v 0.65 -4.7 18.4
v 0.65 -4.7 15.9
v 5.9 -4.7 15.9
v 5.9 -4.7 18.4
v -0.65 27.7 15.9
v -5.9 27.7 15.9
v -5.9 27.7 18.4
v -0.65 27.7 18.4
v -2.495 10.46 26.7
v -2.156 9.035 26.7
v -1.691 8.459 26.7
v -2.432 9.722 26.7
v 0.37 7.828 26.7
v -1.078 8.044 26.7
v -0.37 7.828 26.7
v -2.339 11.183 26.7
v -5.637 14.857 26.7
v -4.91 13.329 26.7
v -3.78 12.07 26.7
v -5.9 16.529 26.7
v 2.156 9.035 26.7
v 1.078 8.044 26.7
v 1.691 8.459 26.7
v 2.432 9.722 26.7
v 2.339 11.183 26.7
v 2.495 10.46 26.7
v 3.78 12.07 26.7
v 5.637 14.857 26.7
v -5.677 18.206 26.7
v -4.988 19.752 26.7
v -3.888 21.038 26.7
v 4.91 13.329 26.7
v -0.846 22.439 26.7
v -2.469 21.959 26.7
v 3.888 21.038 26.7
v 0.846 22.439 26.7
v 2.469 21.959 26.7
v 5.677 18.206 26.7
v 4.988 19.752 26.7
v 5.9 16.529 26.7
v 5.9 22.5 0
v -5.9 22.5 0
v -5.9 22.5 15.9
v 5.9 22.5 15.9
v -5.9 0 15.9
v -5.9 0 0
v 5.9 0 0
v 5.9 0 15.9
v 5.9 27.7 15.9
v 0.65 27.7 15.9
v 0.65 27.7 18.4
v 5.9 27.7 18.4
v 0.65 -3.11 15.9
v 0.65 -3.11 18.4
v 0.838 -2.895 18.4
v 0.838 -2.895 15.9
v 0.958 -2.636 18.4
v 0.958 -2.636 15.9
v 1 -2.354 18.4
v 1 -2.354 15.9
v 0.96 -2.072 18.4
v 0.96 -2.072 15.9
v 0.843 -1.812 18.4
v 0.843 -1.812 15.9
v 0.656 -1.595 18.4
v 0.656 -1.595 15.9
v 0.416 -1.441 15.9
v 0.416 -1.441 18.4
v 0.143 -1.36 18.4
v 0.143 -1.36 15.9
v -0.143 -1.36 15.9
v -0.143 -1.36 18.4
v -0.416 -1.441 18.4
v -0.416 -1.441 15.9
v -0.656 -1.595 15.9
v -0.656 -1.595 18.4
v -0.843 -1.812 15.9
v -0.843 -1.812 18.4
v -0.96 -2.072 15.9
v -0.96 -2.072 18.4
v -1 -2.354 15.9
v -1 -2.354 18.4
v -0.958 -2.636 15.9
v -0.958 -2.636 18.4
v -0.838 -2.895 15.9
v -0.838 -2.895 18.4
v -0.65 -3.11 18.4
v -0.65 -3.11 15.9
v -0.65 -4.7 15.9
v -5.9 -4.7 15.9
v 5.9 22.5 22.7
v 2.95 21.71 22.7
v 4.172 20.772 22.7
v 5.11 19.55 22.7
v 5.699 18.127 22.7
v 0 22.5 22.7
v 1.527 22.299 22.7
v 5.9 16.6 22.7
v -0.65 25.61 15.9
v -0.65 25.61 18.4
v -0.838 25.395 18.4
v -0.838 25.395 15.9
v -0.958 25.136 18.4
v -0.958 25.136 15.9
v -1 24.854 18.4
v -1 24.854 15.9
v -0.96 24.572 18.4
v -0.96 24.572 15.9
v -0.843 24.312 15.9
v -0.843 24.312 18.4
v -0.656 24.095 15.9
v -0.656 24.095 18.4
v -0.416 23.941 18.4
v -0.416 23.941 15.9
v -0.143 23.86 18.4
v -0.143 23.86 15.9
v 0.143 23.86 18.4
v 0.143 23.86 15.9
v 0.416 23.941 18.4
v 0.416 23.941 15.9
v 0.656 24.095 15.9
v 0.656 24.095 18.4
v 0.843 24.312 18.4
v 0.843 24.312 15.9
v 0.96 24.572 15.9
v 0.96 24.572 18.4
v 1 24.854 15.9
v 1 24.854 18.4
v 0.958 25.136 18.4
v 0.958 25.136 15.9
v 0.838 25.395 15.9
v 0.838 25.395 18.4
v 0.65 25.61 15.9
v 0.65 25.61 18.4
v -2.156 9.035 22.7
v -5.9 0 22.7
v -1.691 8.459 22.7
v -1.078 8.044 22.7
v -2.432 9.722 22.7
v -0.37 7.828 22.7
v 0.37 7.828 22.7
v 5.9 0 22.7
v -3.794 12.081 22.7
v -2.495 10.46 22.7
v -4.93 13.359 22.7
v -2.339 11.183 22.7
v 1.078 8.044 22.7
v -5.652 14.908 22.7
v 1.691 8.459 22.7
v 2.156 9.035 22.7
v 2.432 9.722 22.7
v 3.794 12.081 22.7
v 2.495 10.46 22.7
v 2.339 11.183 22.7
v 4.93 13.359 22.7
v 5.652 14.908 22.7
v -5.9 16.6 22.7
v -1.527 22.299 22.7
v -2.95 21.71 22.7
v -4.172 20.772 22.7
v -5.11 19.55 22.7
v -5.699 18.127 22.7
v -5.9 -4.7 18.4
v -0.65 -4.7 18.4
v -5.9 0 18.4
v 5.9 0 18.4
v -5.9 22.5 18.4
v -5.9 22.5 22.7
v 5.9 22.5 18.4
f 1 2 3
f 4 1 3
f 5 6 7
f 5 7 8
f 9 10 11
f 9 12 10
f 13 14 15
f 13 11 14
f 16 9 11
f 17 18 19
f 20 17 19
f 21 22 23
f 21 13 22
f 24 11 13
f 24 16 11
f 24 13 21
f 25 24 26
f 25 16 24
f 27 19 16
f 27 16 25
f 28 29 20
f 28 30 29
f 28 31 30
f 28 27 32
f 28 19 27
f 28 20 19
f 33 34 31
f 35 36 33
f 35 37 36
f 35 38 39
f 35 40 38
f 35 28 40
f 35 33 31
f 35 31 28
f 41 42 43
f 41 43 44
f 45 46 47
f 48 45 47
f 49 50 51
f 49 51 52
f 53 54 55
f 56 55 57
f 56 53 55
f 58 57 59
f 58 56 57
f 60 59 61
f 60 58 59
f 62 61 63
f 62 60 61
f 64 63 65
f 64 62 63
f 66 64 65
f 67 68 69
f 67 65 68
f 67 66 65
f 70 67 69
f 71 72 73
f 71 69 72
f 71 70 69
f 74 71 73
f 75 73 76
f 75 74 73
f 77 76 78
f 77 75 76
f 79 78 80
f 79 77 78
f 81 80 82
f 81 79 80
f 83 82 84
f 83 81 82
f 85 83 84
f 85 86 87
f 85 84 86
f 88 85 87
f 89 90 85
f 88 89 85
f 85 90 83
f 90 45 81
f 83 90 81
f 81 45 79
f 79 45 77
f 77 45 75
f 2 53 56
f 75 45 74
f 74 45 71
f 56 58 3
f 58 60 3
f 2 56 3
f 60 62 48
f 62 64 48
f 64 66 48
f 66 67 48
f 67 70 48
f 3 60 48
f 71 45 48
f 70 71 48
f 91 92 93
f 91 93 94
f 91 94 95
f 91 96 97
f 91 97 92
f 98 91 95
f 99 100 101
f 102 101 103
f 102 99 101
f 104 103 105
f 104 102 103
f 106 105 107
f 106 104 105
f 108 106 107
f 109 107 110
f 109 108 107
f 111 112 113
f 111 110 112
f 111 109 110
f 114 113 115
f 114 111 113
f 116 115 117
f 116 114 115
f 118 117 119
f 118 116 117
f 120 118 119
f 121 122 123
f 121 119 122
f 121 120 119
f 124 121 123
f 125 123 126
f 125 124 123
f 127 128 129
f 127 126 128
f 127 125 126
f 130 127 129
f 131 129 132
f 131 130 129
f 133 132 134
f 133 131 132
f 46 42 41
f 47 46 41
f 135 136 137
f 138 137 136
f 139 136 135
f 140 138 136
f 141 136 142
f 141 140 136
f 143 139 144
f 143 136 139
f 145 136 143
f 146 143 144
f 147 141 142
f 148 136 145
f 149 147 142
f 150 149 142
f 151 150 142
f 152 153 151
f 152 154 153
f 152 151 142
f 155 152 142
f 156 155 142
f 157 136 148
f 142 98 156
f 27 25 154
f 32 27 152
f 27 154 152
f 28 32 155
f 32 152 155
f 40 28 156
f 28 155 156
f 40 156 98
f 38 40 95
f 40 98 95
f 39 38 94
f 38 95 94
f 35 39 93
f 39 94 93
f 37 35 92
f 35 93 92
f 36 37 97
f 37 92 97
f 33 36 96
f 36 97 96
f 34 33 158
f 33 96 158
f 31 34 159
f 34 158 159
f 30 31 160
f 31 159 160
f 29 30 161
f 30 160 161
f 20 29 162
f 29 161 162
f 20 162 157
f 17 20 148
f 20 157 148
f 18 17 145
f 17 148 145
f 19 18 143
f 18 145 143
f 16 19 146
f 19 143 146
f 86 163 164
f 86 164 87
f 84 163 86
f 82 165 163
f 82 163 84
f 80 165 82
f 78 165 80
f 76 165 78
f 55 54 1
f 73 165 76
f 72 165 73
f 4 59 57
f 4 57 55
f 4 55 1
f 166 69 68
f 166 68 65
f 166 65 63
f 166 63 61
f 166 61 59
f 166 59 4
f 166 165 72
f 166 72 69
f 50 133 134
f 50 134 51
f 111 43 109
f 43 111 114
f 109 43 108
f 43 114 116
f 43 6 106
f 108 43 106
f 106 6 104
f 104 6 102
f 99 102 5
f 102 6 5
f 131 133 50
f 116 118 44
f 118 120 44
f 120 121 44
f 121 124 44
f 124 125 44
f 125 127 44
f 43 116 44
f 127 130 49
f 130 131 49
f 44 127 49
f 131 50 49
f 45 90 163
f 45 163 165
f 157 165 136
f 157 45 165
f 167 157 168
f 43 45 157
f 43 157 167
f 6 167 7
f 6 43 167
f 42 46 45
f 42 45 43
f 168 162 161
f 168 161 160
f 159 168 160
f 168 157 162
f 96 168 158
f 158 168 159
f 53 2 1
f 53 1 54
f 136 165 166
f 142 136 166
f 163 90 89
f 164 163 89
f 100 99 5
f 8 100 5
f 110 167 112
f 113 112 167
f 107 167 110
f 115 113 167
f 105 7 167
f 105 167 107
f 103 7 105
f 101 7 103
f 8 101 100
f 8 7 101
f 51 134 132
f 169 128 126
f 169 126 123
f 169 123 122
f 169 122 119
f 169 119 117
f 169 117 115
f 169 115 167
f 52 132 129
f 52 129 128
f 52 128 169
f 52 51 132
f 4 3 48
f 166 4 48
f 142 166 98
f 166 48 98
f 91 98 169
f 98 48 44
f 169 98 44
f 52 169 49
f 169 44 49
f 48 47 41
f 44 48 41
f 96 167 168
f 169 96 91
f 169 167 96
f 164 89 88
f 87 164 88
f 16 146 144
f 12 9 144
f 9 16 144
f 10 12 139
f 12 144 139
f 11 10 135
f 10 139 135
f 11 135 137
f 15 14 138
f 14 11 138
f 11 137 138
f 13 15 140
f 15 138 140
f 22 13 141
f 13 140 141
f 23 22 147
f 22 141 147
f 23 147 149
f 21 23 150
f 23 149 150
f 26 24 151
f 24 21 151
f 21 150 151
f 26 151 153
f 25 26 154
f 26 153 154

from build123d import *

# Parameters (mm, degrees)
BOX004_W          = 1.3
BOX004_H          = 3.3
BOX004_DEPTH      = 10
BOX003_W          = 1.3
BOX003_H          = 3.3
BOX003_DEPTH      = 10
CYLINDER004_R     = 1
CYLINDER004_DEPTH = 10
CYLINDER003_R     = 1
CYLINDER003_DEPTH = 10
CYLINDER001_R     = 2.5
CYLINDER001_DEPTH = 4
CYLINDER_R        = 5.9
CYLINDER_DEPTH    = 4
BOX002_W          = 11.8
BOX002_H          = 32.4
BOX002_DEPTH      = 2.5
BOX001_W          = 11.8
BOX001_H          = 22.5
BOX001_DEPTH      = 22.7


with BuildPart() as cubo004:
    # Box004 → Box004 (new body)
    with BuildSketch(Plane(origin=(5.25, 25, 12), x_dir=(1, 0, 0), z_dir=(0, 0, 1))):
        with Locations((0.65, 1.65)):
            Rectangle(BOX004_W, BOX004_H)
    extrude(amount=BOX004_DEPTH)


with BuildPart() as rebajes:
    # Box003 → Box003 (new body)
    with BuildSketch(Plane(origin=(5.25, -6, 12), x_dir=(1, 0, 0), z_dir=(0, 0, 1))):
        with Locations((0.65, 1.65)):
            Rectangle(BOX003_W, BOX003_H)
    extrude(amount=BOX003_DEPTH)

    # Fusion005: union Cubo004
    add(cubo004.part)


with BuildPart() as taladro2:
    # Cylinder004 → Cylinder004 (new body)
    with BuildSketch(Plane(origin=(5.9, 24.85, 11), x_dir=(1, 0, 0), z_dir=(0, 0, 1))):
        Circle(CYLINDER004_R)
    extrude(amount=CYLINDER004_DEPTH)


with BuildPart() as taladros001:
    # Cylinder003 → Cylinder003 (new body)
    with BuildSketch(Plane(origin=(5.9, -2.35, 11), x_dir=(1, 0, 0), z_dir=(0, 0, 1))):
        Circle(CYLINDER003_R)
    extrude(amount=CYLINDER003_DEPTH)

    # Fusion004: union Taladro2
    add(taladro2.part)

    # Fusion006: union Rebajes
    add(rebajes.part)


with BuildPart() as cilindro001:
    # Cylinder001 → Cylinder001 (new body)
    with BuildSketch(Plane(origin=(5.9, 10.3, 22.7), x_dir=(1, 0, 0), z_dir=(0, 0, 1))):
        Circle(CYLINDER001_R)
    extrude(amount=CYLINDER001_DEPTH)


with BuildPart() as fusion001:
    # Cylinder → Cylinder (new body)
    with BuildSketch(Plane(origin=(5.9, 16.6, 22.7), x_dir=(1, 0, 0), z_dir=(0, 0, 1))):
        Circle(CYLINDER_R)
    extrude(amount=CYLINDER_DEPTH)

    # Fusion001: union Cilindro001
    add(cilindro001.part)


with BuildPart() as cubo002:
    # Box002 → Box002 (new body)
    with BuildSketch(Plane(origin=(0, -4.7, 15.9), x_dir=(1, 0, 0), z_dir=(0, 0, 1))):
        with Locations((5.9, 16.2)):
            Rectangle(BOX002_W, BOX002_H)
    extrude(amount=BOX002_DEPTH)


with BuildPart() as cuerpo_con_taladros:
    # Box001 → Box001 (new body)
    with BuildSketch(Plane.XY):
        with Locations((5.9, 11.25)):
            Rectangle(BOX001_W, BOX001_H)
    extrude(amount=BOX001_DEPTH)

    # Fusion: union Cubo002
    add(cubo002.part)

    # Fusion003: union Fusion001
    add(fusion001.part)

    # Cut001: cut Taladros001
    add(taladros001.part, mode=Mode.SUBTRACT)


with BuildPart() as cuerpo_con_taladros_1:
    # Cut001 placement: moved
    add(cuerpo_con_taladros.part.moved(Location((-5.9, 0, 0))))


solid = cuerpo_con_taladros_1.part
